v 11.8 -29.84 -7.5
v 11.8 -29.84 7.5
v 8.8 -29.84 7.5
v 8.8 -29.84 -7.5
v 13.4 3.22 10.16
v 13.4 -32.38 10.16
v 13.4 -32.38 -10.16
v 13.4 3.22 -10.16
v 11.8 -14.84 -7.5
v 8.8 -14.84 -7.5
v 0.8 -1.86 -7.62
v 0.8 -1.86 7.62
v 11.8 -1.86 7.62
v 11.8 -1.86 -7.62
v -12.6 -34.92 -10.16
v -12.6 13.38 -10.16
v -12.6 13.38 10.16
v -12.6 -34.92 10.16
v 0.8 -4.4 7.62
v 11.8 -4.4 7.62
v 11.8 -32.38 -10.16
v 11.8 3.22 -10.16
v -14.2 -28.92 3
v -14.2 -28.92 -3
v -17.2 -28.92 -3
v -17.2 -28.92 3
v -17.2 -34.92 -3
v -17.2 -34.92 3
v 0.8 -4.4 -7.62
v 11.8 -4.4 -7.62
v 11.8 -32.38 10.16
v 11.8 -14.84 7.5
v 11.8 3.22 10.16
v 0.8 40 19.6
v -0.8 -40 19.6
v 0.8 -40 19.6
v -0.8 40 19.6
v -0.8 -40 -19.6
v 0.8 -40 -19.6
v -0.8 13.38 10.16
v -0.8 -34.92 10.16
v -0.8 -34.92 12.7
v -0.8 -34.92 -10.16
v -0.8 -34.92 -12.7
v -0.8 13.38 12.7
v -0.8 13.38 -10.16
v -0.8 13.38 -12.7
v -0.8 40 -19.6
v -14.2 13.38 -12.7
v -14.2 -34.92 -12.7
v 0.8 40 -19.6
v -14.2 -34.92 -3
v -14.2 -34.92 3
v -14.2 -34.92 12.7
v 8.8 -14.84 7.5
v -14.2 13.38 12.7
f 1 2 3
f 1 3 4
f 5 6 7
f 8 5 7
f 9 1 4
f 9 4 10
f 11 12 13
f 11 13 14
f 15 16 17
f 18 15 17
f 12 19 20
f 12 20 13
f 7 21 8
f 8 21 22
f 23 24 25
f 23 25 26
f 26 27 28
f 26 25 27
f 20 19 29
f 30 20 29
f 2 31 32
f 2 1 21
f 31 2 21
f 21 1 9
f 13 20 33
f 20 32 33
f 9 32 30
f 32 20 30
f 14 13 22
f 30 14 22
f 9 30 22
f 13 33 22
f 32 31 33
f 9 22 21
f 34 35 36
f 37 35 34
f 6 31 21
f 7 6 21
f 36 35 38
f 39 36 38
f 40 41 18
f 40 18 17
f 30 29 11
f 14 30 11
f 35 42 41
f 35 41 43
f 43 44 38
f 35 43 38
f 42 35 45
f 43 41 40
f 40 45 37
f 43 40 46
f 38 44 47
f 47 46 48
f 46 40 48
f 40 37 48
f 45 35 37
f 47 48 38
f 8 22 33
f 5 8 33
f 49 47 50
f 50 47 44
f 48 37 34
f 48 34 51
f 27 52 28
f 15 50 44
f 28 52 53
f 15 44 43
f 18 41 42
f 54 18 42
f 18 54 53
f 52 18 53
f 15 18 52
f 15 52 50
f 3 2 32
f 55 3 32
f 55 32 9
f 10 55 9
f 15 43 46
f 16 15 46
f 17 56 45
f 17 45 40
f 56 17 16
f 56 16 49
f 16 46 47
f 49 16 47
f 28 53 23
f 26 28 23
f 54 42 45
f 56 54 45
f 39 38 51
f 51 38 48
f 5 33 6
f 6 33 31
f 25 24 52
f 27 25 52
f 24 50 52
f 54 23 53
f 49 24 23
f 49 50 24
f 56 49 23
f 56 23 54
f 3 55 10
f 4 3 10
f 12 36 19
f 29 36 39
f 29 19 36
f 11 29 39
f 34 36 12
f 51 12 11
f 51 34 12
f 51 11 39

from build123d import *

# Parameters (mm, degrees)
EXTRUDE_1_DEPTH      = 0.8
EXTRUDE_1_DEPTH_BACK = 0.8
SKETCH_1_W           = 39.2
SKETCH_1_H           = 80
SKETCH_1_3_W         = 15.24
SKETCH_1_3_H         = 2.54
EXTRUDE_2_DEPTH      = 11.8
SKETCH_2_W           = 20.32
SKETCH_2_H           = 35.6
EXTRUDE_3_DEPTH      = 1.6
SKETCH_2_3_W         = 15
SKETCH_2_3_H         = 15
EXTRUDE_4_DEPTH      = 3
SKETCH_1_4_W         = 2.54
SKETCH_1_4_H         = 48.3
EXTRUDE_6_DEPTH      = 12.6
EXTRUDE_7_DEPTH      = 1.6
SKETCH_3_3_W         = 6
SKETCH_3_3_H         = 6
EXTRUDE_8_DEPTH      = 4.6


with BuildPart() as part:
    # 草圖1 → 填料-伸長1 (new, two sides: drawn at the far end of the back side and taken through both)
    with BuildSketch(Plane(origin=(0, 0, 0), x_dir=(0, 0, -1), z_dir=(1, 0, 0)).offset(-EXTRUDE_1_DEPTH_BACK)):
        Rectangle(SKETCH_1_W, SKETCH_1_H)
    extrude(amount=EXTRUDE_1_DEPTH + EXTRUDE_1_DEPTH_BACK)

    # 草圖1<3> → 填料-伸長2 (add)
    with BuildSketch(Plane(origin=(0, 0, 0), x_dir=(0, 0, -1), z_dir=(1, 0, 0))):
        with Locations((0, -3.13)):
            Rectangle(SKETCH_1_3_W, SKETCH_1_3_H)
    extrude(amount=EXTRUDE_2_DEPTH)

    # 草圖2 → 填料-伸長3 (add)
    with BuildSketch(Plane(origin=(11.8, 0, 0), x_dir=(0, 0, -1), z_dir=(1, 0, 0))):
        with Locations((0, -14.58)):
            Rectangle(SKETCH_2_W, SKETCH_2_H)
    extrude(amount=EXTRUDE_3_DEPTH)

    # 草圖2<3> → 填料-伸長4 (add)
    with BuildSketch(Plane(origin=(11.8, 0, 0), x_dir=(0, 0, -1), z_dir=(1, 0, 0))):
        with Locations((0, -22.34)):
            Rectangle(SKETCH_2_3_W, SKETCH_2_3_H)
    extrude(amount=-EXTRUDE_4_DEPTH)

    # 草圖1<4> → 填料-伸長6 (add)
    with BuildSketch(Plane(origin=(0, 0, 0), x_dir=(0, 0, -1), z_dir=(1, 0, 0))):
        with Locations((-11.43, -10.77)):
            Rectangle(SKETCH_1_4_W, SKETCH_1_4_H)
        with Locations((11.43, -10.77)):
            Rectangle(SKETCH_1_4_W, SKETCH_1_4_H)
    extrude(amount=-EXTRUDE_6_DEPTH)

    # 草圖3 → 填料-伸長7 (add)
    with BuildSketch(Plane.ZY.offset(12.6)):
        Polygon((-12.7, -34.92), (-3, -34.92), (-3, -28.92), (3, -28.92), (3, -34.92), (12.7, -34.92), (12.7, 13.38), (-12.7, 13.38), align=None)
    extrude(amount=EXTRUDE_7_DEPTH)

    # 草圖3<3> → 填料-伸長8 (add)
    with BuildSketch(Plane.ZY.offset(12.6)):
        with Locations((0, -31.92)):
            Rectangle(SKETCH_3_3_W, SKETCH_3_3_H)
    extrude(amount=EXTRUDE_8_DEPTH)


solid = part.part
